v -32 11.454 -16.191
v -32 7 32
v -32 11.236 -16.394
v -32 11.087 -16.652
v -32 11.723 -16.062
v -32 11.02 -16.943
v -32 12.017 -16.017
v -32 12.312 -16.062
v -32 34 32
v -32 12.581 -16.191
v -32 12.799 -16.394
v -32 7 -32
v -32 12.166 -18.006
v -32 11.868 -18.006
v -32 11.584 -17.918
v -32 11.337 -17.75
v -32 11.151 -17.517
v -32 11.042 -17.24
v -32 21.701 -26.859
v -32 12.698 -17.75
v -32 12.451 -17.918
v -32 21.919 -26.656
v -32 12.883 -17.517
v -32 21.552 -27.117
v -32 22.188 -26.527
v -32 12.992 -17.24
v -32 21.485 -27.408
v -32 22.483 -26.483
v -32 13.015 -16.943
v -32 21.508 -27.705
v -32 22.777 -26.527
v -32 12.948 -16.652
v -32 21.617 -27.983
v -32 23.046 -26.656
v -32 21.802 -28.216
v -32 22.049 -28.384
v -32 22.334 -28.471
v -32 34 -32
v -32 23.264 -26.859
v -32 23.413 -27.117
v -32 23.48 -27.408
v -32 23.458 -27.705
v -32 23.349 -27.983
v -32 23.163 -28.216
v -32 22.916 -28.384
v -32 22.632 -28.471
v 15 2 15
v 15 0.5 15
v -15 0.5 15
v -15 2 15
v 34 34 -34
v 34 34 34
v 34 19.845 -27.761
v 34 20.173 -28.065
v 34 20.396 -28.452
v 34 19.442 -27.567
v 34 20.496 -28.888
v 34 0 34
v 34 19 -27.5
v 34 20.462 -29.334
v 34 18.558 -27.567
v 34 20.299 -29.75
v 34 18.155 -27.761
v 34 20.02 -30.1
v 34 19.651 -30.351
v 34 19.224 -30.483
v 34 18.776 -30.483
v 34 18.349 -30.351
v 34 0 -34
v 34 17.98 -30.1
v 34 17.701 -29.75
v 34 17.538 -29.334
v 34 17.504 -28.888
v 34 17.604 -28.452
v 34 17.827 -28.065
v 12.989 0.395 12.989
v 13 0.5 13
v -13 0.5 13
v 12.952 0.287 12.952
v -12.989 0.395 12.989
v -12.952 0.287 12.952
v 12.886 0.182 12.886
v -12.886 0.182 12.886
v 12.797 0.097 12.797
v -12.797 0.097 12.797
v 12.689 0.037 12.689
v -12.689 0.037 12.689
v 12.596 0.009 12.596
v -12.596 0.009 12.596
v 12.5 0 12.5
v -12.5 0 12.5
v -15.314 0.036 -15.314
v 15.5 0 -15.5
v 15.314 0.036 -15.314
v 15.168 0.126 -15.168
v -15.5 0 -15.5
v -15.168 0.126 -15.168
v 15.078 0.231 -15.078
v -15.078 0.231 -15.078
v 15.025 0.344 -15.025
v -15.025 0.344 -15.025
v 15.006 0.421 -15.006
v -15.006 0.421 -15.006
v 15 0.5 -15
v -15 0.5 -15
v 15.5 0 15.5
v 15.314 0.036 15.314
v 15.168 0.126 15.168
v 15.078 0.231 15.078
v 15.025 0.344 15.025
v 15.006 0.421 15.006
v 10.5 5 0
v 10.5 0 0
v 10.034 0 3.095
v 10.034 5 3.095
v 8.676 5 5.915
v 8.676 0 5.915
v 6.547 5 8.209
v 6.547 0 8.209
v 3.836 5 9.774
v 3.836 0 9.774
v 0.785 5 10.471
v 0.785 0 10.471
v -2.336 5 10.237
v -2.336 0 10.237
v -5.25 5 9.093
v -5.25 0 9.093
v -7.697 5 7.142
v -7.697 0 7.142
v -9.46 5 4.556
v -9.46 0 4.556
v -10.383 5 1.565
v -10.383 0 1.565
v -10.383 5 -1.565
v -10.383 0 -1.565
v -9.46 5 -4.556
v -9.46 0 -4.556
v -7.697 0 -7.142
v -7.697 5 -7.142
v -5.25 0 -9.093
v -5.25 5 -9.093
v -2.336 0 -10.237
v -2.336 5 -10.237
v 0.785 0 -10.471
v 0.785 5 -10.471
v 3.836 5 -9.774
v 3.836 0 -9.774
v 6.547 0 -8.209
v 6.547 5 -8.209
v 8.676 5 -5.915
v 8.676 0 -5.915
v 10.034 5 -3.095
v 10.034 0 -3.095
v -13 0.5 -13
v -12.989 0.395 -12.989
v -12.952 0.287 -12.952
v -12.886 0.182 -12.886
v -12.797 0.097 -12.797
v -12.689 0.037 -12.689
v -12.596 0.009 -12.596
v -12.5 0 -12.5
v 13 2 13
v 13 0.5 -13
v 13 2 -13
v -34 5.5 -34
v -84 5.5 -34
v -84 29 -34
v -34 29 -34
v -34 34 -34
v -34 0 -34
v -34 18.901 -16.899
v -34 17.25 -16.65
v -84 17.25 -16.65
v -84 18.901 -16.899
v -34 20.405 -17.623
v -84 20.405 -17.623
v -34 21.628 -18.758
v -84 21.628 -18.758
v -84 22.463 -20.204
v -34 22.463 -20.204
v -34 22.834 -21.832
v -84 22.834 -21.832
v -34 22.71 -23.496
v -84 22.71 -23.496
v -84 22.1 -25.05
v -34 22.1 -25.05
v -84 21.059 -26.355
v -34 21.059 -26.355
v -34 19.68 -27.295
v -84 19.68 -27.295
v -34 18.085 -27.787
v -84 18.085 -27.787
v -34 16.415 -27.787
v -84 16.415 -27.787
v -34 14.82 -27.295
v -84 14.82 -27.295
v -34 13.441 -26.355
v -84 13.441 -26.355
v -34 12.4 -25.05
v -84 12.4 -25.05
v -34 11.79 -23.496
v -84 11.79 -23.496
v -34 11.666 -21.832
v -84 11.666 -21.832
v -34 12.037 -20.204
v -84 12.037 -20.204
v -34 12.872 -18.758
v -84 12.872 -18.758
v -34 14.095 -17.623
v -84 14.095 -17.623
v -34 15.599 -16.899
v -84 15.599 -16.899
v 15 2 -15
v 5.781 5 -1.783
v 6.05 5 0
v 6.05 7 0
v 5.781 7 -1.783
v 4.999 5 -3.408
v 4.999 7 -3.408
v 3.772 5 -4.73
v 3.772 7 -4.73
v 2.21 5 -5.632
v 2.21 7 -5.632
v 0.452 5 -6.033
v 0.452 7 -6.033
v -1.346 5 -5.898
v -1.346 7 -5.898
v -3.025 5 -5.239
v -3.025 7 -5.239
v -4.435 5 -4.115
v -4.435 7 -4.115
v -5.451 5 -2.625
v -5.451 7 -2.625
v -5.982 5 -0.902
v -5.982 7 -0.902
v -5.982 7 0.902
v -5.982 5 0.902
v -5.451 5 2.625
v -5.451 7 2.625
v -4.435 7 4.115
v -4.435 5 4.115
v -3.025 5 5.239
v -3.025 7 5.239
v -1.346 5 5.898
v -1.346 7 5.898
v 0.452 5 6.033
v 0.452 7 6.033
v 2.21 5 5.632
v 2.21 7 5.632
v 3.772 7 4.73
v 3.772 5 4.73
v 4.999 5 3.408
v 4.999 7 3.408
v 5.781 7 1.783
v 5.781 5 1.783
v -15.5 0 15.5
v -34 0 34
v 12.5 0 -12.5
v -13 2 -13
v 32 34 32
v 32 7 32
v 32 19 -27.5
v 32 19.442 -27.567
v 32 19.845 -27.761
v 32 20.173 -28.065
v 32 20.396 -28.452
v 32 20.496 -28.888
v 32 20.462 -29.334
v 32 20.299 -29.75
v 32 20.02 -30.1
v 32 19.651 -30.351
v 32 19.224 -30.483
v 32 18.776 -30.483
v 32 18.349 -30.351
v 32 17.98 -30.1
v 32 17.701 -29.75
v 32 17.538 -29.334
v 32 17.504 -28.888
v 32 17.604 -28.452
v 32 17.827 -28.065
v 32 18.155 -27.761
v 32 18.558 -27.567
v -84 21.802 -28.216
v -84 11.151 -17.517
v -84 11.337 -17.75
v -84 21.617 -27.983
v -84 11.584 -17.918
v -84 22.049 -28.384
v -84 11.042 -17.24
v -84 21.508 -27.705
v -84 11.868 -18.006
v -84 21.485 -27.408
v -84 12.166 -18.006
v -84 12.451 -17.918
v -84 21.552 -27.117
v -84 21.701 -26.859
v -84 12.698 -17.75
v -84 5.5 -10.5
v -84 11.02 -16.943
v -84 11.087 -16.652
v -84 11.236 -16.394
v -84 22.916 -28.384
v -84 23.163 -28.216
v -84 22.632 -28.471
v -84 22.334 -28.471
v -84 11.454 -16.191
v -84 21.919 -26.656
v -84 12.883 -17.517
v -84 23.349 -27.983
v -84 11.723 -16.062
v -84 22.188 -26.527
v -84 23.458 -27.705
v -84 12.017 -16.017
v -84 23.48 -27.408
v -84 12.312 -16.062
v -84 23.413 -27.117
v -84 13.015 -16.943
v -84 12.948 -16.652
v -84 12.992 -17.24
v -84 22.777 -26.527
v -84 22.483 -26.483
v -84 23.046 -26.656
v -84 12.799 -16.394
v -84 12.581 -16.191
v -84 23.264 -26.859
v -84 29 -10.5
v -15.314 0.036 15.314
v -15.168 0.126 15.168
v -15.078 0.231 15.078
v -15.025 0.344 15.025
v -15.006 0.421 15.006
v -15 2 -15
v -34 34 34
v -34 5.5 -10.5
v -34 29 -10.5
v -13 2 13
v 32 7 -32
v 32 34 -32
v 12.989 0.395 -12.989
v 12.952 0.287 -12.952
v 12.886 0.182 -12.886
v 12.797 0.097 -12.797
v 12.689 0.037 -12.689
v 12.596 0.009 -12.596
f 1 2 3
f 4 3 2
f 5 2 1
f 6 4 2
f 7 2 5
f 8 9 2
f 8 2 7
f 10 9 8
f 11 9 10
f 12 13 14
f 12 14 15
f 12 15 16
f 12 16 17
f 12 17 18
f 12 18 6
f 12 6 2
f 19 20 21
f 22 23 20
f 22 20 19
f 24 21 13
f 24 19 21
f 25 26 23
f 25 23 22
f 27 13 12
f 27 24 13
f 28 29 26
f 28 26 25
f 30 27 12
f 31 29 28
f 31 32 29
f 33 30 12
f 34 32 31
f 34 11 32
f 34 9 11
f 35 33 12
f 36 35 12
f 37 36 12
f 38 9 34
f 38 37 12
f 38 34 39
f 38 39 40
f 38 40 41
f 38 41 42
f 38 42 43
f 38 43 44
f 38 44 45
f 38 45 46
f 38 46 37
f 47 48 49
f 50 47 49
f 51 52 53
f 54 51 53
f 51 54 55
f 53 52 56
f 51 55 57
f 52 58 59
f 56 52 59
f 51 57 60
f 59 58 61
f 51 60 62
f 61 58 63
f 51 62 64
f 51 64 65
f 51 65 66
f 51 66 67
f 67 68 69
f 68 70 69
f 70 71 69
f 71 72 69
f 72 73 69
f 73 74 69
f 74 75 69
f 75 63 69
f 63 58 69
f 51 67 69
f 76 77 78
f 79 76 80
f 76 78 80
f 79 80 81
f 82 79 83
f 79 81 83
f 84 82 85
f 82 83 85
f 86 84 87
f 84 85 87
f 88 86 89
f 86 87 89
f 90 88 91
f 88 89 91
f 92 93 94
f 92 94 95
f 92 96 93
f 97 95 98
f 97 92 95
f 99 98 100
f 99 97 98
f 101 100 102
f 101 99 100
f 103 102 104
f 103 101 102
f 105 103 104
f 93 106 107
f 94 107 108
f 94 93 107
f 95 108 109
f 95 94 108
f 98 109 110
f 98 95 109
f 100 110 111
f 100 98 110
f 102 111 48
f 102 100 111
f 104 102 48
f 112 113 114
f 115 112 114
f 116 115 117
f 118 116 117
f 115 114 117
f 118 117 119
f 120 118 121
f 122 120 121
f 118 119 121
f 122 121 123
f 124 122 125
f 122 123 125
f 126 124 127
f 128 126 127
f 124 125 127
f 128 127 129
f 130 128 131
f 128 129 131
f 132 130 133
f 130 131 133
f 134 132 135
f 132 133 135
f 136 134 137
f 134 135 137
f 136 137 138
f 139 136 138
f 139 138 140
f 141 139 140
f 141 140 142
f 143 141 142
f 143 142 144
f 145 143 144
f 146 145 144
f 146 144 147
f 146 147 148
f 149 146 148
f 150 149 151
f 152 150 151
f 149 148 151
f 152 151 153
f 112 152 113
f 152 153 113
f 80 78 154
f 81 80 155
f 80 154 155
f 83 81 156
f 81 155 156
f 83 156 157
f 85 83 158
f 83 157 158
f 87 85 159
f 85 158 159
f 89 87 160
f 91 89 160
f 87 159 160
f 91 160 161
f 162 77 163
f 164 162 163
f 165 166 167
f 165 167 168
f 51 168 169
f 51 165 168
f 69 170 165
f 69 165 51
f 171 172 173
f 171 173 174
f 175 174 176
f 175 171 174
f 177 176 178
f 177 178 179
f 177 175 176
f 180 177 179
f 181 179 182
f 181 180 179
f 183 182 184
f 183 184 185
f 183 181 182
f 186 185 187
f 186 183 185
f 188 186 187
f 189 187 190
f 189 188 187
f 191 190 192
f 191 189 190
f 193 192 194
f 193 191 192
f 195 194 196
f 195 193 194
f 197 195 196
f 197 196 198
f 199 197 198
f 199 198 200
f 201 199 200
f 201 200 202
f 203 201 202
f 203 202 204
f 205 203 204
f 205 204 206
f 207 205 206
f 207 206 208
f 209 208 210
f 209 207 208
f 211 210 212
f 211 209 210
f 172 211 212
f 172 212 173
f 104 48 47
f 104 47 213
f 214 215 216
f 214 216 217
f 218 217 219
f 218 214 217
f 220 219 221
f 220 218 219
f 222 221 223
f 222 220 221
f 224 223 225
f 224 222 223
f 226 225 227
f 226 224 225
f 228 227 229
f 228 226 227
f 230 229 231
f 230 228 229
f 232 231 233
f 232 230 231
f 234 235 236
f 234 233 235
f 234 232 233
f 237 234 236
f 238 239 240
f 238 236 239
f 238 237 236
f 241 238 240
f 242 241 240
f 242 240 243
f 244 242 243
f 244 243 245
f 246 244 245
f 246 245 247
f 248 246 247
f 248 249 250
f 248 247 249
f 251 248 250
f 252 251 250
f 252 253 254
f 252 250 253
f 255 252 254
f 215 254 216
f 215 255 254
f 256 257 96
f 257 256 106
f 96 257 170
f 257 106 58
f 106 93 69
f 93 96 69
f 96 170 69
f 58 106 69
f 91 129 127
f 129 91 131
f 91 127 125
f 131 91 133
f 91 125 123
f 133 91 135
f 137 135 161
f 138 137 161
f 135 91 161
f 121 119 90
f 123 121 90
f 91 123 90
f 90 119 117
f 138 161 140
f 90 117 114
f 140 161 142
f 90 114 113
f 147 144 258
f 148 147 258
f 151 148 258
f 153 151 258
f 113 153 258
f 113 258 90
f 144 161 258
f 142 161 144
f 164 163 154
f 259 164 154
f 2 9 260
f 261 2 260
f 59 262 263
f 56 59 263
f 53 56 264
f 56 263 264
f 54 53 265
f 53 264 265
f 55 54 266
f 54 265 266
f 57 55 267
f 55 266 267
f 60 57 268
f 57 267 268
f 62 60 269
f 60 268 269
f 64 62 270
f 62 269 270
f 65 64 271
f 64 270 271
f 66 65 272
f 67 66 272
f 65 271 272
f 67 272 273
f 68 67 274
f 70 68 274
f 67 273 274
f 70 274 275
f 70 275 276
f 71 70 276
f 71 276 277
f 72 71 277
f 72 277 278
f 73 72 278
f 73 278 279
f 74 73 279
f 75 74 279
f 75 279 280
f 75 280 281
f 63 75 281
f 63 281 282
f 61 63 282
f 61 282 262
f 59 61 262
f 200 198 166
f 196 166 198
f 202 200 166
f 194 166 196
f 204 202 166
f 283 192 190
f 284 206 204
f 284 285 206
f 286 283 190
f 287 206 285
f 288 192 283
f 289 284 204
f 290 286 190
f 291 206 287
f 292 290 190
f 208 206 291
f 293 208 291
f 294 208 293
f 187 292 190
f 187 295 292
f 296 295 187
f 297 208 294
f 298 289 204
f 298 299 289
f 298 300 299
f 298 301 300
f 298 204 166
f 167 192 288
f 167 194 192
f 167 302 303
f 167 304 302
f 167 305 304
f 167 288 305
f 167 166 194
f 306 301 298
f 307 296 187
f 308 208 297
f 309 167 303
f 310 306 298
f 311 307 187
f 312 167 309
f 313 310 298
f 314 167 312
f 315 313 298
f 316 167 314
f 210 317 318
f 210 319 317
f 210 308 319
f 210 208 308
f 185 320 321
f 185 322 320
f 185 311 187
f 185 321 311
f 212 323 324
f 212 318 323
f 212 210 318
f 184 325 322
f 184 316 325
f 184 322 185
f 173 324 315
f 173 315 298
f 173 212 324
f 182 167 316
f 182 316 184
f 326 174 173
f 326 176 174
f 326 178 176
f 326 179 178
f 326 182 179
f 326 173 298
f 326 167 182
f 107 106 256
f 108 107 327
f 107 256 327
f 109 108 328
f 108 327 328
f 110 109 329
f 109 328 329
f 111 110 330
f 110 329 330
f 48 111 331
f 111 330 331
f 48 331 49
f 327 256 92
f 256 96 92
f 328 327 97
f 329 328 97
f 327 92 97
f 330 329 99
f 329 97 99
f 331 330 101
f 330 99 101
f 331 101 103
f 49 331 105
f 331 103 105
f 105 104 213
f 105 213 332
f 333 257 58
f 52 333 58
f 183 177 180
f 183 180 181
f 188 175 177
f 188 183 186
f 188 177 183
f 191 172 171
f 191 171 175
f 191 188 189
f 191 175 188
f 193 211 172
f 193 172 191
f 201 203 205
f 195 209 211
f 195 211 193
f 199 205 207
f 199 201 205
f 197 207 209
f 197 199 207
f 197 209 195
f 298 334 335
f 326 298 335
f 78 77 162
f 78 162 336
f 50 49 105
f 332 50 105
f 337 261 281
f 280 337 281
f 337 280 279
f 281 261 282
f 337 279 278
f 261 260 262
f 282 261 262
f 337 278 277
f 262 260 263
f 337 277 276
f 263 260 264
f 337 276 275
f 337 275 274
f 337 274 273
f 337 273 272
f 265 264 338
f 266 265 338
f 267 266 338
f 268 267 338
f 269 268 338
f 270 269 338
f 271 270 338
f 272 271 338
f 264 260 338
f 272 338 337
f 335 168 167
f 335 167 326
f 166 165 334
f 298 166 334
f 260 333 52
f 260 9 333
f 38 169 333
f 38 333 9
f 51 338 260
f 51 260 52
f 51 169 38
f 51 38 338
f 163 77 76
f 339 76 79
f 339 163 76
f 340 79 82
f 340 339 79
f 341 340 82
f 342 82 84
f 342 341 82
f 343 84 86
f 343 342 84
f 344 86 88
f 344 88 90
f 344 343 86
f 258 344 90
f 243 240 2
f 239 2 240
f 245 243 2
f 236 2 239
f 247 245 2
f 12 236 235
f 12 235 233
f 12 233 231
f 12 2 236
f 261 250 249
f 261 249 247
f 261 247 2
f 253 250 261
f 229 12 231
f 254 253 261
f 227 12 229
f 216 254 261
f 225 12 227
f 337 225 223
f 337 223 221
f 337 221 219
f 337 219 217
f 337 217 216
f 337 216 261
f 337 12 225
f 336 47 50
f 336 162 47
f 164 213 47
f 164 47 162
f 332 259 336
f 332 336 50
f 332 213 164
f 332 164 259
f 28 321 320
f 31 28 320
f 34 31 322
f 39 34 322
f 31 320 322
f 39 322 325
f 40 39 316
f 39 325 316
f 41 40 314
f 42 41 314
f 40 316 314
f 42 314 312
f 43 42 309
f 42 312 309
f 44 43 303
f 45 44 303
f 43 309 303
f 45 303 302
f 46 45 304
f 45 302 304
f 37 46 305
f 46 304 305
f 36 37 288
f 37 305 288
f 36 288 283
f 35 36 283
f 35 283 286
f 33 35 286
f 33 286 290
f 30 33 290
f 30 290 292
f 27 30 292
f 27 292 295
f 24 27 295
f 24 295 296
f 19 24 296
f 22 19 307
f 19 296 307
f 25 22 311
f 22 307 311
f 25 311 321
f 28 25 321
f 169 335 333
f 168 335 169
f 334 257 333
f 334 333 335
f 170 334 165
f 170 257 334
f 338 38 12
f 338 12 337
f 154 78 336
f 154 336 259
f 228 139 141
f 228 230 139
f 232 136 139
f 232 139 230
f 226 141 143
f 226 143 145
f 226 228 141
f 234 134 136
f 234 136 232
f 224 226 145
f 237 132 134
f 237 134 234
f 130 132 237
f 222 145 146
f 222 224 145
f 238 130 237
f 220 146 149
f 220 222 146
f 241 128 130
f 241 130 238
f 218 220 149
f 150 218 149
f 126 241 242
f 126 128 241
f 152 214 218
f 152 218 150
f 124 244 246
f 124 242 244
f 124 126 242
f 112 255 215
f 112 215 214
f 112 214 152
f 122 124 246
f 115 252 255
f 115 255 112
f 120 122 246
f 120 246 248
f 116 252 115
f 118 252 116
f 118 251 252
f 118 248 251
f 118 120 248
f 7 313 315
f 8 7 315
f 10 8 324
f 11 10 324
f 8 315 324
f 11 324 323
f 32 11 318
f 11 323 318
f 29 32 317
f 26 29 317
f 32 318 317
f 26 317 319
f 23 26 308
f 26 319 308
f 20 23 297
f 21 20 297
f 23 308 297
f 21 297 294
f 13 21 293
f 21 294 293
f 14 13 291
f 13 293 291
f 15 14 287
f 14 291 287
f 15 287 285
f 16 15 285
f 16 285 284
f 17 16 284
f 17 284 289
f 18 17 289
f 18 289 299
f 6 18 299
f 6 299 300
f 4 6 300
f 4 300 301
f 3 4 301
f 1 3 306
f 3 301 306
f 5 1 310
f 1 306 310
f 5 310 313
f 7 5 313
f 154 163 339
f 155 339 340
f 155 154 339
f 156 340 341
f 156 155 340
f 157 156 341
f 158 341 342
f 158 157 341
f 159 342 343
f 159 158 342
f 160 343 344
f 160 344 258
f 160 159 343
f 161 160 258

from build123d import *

# Parameters (mm, degrees)
SKETCH1_W           = 68
SKETCH1_H           = 68
BOSS_EXTRUDE1_DEPTH = 34
CUT_EXTRUDE1_START  = 34
SKETCH2_W           = 64
SKETCH2_H           = 64
CUT_EXTRUDE1_DEPTH  = 27
SKETCH6_R           = 10.5
CUT_EXTRUDE10_DEPTH = 5
SKETCH7_W           = 30
SKETCH7_H           = 30
SKETCH7_W_2         = 26
SKETCH7_H_2         = 26
CUT_EXTRUDE11_DEPTH = 2
SKETCH8_R           = 1.5
CUT_EXTRUDE12_DEPTH = 3
SKETCH9_W           = 23.5
SKETCH9_H           = 23.5
SKETCH9_R           = 5.6
BOSS_EXTRUDE4_DEPTH = 50
SKETCH11_R          = 1
CUT_EXTRUDE13_DEPTH = 52
SKETCH5_R           = 6.05
CUT_EXTRUDE14_DEPTH = 35
FILLET1_R           = 0.5


with BuildPart() as part:
    # Sketch1 → Boss-Extrude1 (new body)
    with BuildSketch(Plane(origin=(0, 0, 0), x_dir=(1, 0, 0), z_dir=(0, 1, 0))):
        Rectangle(SKETCH1_W, SKETCH1_H)
    extrude(amount=BOSS_EXTRUDE1_DEPTH)

    # Sketch2 → Cut-Extrude1 (cut)
    with BuildSketch(Plane(origin=(0, 0, 0), x_dir=(1, 0, 0), z_dir=(0, 1, 0)).offset(CUT_EXTRUDE1_START)):
        Rectangle(SKETCH2_W, SKETCH2_H)
    extrude(amount=-CUT_EXTRUDE1_DEPTH, mode=Mode.SUBTRACT)

    # Sketch6 → Cut-Extrude10 (cut)
    with BuildSketch(Plane.XZ):
        Circle(SKETCH6_R)
    extrude(amount=-CUT_EXTRUDE10_DEPTH, mode=Mode.SUBTRACT)

    # Sketch7 → Cut-Extrude11 (cut)
    with BuildSketch(Plane(origin=(0, 0, 0), x_dir=(-1, 0, 0), z_dir=(0, -1, 0))):
        Rectangle(SKETCH7_W, SKETCH7_H)
        Rectangle(SKETCH7_W_2, SKETCH7_H_2, mode=Mode.SUBTRACT)
    extrude(amount=-CUT_EXTRUDE11_DEPTH, mode=Mode.SUBTRACT)

    # Sketch8 → Cut-Extrude12 (cut, through all)
    with BuildSketch(Plane.ZY.offset(-32)):
        with Locations((-29, 19)):
            Circle(SKETCH8_R)
    extrude(amount=-CUT_EXTRUDE12_DEPTH, mode=Mode.SUBTRACT)

    # Sketch9 → Boss-Extrude4 (add)
    with BuildSketch(Plane.ZY.offset(34)):
        with Locations((-22.25, 17.25)):
            Rectangle(SKETCH9_W, SKETCH9_H)
        with Locations((-22.25, 17.25)):
            Circle(SKETCH9_R, mode=Mode.SUBTRACT)
    extrude(amount=BOSS_EXTRUDE4_DEPTH)

    # Sketch11 → Cut-Extrude13 (cut)
    with BuildSketch(Plane.ZY.offset(84)):
        with Locations((-27.482590181, 22.482590181)):
            Circle(SKETCH11_R)
        with Locations((-17.017409819, 12.017409819)):
            Circle(SKETCH11_R)
    extrude(amount=-CUT_EXTRUDE13_DEPTH, mode=Mode.SUBTRACT)

    # Sketch5 → Cut-Extrude14 (cut, through all)
    with BuildSketch(Plane(origin=(0, 0, 0), x_dir=(1, 0, 0), z_dir=(0, 1, 0))):
        Circle(SKETCH5_R)
    extrude(amount=CUT_EXTRUDE14_DEPTH, mode=Mode.SUBTRACT)

    # Fillet1
    fillet1_edges = [part.edges().sort_by_distance(p)[0] for p in [
        (15, 0, 0),
        (0, 0, 15),
        (-15, 0, 0),
        (0, 0, -15),
        (13, 0, 0),
        (0, 0, -13),
        (-13, 0, 0),
        (0, 0, 13),
    ]]
    fillet(fillet1_edges, radius=FILLET1_R)


solid = part.part
